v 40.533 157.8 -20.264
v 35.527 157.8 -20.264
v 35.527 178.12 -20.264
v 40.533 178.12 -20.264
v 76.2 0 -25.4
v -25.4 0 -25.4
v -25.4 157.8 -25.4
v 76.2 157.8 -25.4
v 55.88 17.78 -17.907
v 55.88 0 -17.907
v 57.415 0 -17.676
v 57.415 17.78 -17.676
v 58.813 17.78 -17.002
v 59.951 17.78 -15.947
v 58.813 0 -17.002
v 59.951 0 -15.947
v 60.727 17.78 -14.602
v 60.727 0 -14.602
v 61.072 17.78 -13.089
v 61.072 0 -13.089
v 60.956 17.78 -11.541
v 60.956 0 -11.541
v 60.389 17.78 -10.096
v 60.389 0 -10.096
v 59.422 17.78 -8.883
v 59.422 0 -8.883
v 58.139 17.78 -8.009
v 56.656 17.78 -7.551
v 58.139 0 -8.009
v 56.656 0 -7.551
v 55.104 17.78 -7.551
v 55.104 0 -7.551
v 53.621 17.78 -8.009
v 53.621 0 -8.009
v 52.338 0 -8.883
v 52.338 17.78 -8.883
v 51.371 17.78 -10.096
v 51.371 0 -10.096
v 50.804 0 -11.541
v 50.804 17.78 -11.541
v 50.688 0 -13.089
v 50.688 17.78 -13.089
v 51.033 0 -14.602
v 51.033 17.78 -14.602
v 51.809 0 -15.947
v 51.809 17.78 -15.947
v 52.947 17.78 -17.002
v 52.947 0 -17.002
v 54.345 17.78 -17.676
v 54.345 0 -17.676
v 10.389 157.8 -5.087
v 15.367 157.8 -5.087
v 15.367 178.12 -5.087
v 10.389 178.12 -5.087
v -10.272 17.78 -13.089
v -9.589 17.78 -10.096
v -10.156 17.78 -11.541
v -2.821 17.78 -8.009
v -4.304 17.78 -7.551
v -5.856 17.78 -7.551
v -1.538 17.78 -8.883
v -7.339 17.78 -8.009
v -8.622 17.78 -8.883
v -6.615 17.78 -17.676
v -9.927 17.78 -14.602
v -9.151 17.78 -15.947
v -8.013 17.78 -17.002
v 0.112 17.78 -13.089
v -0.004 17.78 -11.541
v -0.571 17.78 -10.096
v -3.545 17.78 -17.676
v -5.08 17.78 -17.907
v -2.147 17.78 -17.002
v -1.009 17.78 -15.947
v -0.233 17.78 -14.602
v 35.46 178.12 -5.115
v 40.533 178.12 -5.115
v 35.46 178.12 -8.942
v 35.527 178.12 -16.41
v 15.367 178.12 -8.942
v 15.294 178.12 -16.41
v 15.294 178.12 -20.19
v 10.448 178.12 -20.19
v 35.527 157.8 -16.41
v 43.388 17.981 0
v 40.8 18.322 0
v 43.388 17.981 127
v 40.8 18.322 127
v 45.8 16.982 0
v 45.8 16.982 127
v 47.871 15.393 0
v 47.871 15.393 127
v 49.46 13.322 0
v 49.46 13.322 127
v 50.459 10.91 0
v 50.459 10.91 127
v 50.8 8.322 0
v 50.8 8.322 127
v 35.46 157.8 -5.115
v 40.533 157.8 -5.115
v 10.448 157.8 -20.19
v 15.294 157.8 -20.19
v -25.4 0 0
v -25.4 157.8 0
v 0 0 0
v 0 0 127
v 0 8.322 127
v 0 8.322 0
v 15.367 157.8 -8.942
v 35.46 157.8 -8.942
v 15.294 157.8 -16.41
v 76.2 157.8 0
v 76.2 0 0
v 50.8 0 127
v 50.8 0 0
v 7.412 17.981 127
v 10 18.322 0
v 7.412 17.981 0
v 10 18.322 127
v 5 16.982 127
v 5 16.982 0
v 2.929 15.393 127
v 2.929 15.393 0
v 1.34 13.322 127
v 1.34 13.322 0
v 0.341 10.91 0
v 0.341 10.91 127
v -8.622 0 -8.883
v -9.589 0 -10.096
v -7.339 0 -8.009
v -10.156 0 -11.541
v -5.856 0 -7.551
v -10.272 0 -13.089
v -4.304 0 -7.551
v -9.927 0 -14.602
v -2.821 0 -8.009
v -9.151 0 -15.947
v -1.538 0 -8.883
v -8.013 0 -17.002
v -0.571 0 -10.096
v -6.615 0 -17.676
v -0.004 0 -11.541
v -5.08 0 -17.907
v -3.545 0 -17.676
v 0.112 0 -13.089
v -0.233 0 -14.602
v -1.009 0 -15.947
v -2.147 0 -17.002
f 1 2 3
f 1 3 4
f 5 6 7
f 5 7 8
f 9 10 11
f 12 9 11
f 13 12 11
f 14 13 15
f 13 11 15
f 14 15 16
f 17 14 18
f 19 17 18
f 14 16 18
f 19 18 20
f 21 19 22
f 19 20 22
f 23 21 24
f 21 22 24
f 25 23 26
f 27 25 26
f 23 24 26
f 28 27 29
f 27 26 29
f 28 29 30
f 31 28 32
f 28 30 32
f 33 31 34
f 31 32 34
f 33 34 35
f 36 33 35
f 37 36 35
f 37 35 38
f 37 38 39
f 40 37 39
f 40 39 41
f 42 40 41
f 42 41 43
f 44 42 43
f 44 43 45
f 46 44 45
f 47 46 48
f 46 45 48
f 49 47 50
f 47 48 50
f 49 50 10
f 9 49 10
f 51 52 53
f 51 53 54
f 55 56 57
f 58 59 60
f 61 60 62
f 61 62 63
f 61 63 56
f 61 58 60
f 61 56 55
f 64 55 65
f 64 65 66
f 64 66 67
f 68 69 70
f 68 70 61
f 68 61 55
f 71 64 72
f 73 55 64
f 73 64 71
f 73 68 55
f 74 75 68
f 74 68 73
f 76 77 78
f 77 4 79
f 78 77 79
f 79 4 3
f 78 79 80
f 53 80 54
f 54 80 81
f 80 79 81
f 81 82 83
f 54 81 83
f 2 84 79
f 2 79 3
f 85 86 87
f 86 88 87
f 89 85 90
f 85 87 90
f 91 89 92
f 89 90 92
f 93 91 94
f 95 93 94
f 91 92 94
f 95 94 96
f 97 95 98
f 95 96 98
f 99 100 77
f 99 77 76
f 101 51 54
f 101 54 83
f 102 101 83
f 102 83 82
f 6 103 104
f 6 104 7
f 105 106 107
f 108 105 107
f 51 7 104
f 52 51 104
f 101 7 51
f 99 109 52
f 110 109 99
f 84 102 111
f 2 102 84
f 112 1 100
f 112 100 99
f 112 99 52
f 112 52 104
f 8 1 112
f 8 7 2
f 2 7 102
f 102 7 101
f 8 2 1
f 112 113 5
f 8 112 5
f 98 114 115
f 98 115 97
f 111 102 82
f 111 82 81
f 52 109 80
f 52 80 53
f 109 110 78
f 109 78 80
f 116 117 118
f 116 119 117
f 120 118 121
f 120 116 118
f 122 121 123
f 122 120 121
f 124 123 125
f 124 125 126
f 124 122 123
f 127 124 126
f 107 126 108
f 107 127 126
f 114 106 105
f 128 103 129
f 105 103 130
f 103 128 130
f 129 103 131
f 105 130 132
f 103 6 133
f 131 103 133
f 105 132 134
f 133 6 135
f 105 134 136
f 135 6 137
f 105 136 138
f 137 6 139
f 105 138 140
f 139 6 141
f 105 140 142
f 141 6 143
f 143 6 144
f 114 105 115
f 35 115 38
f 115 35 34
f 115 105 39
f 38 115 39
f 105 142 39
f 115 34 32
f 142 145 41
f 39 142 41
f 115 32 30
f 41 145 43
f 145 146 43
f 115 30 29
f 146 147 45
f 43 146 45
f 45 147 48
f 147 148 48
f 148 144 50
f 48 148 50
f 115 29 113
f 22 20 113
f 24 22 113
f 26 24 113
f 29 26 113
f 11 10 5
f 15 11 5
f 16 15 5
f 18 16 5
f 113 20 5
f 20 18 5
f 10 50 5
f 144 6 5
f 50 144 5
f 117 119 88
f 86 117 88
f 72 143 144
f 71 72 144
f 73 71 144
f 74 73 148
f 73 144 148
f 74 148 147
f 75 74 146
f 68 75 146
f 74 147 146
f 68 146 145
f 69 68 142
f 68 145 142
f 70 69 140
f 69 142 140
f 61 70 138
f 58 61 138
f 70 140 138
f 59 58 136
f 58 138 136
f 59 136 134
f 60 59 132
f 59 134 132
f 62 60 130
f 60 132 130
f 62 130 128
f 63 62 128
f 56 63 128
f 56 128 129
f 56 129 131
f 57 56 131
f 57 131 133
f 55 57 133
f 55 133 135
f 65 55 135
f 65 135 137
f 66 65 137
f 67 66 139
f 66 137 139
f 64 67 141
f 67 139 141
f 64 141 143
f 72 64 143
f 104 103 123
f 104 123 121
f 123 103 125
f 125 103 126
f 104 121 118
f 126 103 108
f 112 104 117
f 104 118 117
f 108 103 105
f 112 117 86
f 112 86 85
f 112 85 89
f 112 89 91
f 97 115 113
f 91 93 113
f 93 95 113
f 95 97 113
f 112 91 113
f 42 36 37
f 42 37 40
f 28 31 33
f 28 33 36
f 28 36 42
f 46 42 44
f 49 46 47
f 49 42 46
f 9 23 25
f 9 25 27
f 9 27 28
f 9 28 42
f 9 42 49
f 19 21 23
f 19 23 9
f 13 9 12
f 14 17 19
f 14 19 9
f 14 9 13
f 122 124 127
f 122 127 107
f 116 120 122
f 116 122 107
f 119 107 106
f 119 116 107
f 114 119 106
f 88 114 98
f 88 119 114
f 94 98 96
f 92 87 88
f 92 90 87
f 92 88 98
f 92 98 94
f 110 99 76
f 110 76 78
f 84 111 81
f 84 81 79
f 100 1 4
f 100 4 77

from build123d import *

# Parameters (mm, degrees)
SKETCH3_W           = 101.6
SKETCH3_H           = 25.4
BOSS_EXTRUDE1_DEPTH = 157.8
BOSS_EXTRUDE4_DEPTH = 20.32
SKETCH7_R           = 5.207
CUT_EXTRUDE1_DEPTH  = 17.78
SKETCH8_W           = 50.8
SKETCH8_H           = 18.321584398
BOSS_EXTRUDE5_DEPTH = 127
FILLET1_R           = 10
FILLET2_R           = 10


with BuildPart() as part:
    # Sketch3 → Boss-Extrude1 (new body)
    with BuildSketch(Plane(origin=(0, 0, 0), x_dir=(1, 0, 0), z_dir=(0, 1, 0))):
        with Locations((25.4, 12.7)):
            Rectangle(SKETCH3_W, SKETCH3_H)
    extrude(amount=BOSS_EXTRUDE1_DEPTH)

    # Sketch6 → Boss-Extrude4 (add)
    with BuildSketch(Plane(origin=(0, 157.8, 0), x_dir=(1, 0, 0), z_dir=(0, 1, 0))):
        Polygon((10.447692892, 20.189678665), (15.293534065, 20.189678665), (15.293534065, 16.409589502), (35.527040487, 16.409589502), (35.527040487, 20.263619063), (40.533430612, 20.263619063), (40.533430612, 5.114574025), (35.460110097, 5.114574025), (35.460110097, 8.942217594), (15.367197577, 8.942217594), (15.367197577, 5.087318386), (10.388766814, 5.087318386), align=None)
    extrude(amount=BOSS_EXTRUDE4_DEPTH)

    # Sketch7 → Cut-Extrude1 (cut)
    with BuildSketch(Plane(origin=(0, 0, 0), x_dir=(-1, 0, 0), z_dir=(0, -1, 0))):
        with Locations(Location((5.08, 12.7, 0), (0, 0, 90))):
            Circle(SKETCH7_R)
        with Locations(Location((-55.88, 12.7, 0), (0, 0, 90))):
            Circle(SKETCH7_R)
    extrude(amount=-CUT_EXTRUDE1_DEPTH, mode=Mode.SUBTRACT)

    # Sketch8 → Boss-Extrude5 (add)
    with BuildSketch(Plane.XY):
        with Locations((25.4, 9.160792199)):
            Rectangle(SKETCH8_W, SKETCH8_H)
    extrude(amount=BOSS_EXTRUDE5_DEPTH)

    # Fillet1
    fillet1_edges = [part.edges().sort_by_distance(p)[0] for p in [
        (50.8, 18.321584398, 63.5),
    ]]
    fillet(fillet1_edges, radius=FILLET1_R)

    # Fillet2
    fillet2_edges = [part.edges().sort_by_distance(p)[0] for p in [
        (0, 18.321584398, 63.5),
    ]]
    fillet(fillet2_edges, radius=FILLET2_R)


solid = part.part
